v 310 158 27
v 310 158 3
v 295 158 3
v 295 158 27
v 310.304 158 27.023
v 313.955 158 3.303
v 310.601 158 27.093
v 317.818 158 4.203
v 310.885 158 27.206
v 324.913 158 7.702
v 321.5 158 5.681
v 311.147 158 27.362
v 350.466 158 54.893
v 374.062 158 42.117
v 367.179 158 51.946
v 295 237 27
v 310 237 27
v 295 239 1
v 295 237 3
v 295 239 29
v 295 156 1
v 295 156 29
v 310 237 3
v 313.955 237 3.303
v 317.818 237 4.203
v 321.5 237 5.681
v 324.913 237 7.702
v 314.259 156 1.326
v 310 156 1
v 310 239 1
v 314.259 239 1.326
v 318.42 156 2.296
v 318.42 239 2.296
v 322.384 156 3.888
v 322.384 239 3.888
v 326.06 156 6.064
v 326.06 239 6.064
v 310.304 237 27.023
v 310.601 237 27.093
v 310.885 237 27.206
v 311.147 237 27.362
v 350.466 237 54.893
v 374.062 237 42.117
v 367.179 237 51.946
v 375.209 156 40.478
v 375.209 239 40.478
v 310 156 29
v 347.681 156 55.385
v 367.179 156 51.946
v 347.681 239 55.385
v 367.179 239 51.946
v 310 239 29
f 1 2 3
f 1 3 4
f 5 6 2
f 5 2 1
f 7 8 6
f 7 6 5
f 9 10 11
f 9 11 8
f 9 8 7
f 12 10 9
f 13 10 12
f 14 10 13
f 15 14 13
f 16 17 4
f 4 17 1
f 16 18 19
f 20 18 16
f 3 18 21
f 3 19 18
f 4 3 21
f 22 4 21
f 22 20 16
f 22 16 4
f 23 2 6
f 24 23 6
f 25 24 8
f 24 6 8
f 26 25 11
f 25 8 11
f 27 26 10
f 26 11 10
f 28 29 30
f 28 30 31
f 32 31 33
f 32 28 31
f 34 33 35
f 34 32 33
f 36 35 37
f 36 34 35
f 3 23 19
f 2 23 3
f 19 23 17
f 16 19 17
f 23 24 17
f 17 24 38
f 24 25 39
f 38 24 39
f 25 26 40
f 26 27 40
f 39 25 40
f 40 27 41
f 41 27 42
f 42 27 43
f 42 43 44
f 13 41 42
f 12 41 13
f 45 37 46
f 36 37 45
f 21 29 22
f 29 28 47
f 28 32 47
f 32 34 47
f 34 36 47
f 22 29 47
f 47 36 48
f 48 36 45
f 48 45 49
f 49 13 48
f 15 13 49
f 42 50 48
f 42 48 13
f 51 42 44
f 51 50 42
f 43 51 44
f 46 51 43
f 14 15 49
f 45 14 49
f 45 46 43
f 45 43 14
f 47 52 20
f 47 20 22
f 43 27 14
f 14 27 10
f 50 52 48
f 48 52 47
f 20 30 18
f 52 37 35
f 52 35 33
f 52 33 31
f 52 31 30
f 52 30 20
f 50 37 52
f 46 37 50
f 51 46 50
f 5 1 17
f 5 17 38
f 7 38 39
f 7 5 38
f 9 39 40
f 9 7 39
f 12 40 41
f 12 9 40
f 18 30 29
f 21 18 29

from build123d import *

# Parameters (mm, degrees)
SKETCH019_W             = 83
SKETCH019_H             = 28
SKETCH019_W_2           = 79
SKETCH019_H_2           = 24
REVOLUTION_ANGLE        = 35
SKETCH020_W             = 83
SKETCH020_H             = 28
SKETCH020_W_2           = 79
SKETCH020_H_2           = 24
PAD010_DEPTH            = 60
POCKET006_DEPTH         = 83.001
SKETCH022_W             = 83
SKETCH022_H             = 28
SKETCH022_W_2           = 79
SKETCH022_H_2           = 24
PAD011_DEPTH            = 15
BODY005_PLACEMENT_ANGLE = 180


with BuildPart() as part:
    # Sketch019 → Revolution (revolve)
    with BuildSketch(Plane(origin=(310, 156, 1), x_dir=(0, 1, 0), z_dir=(1, 0, 0))):
        with Locations((41.5, 14)):
            Rectangle(SKETCH019_W, SKETCH019_H)
        with Locations((41.5, 14)):
            Rectangle(SKETCH019_W_2, SKETCH019_H_2, mode=Mode.SUBTRACT)
    revolve(axis=Axis((310, 156, 1), (0, 1, 0)), revolution_arc=REVOLUTION_ANGLE)

    # Sketch020 (on Face9 of Revolution) → Pad010 (new body)
    with BuildSketch(Plane(origin=(207.543276, 0, -145.323366), x_dir=(0, 1, 0), z_dir=(0.819152, 0, -0.573576))):
        with Locations((197.5, 192.627847)):
            Rectangle(SKETCH020_W, SKETCH020_H)
        with Locations((197.5, 192.627847)):
            Rectangle(SKETCH020_W_2, SKETCH020_H_2, mode=Mode.SUBTRACT)
    extrude(amount=PAD010_DEPTH)

    # Sketch021 (on Face11 of Pad010) → Pocket006 (cut, through all)
    with BuildSketch(Plane(origin=(0, 156, 0), x_dir=(0, 0, -1), z_dir=(0, -1, 0))):
        Polygon((21.946458, 367.179193), (33.414586, 359.149123), (25.384516, 347.680994), align=None)
    extrude(amount=-POCKET006_DEPTH, mode=Mode.SUBTRACT)

    # Sketch022 (on Face4 of Pocket006) → Pad011 (join)
    with BuildSketch(Plane(origin=(310, 0, 0), x_dir=(0, 1, 0), z_dir=(-1, 0, 0))):
        with Locations((197.5, -15)):
            Rectangle(SKETCH022_W, SKETCH022_H)
        with Locations((197.5, -15)):
            Rectangle(SKETCH022_W_2, SKETCH022_H_2, mode=Mode.SUBTRACT)
    extrude(amount=PAD011_DEPTH)


with BuildPart() as part_1:
    # Body005 placement: moved
    add(part.part.moved(Location((0, 395, 30))).rotate(Axis((0, 395, 30), (1, 0, 0)), BODY005_PLACEMENT_ANGLE))


solid = part_1.part
